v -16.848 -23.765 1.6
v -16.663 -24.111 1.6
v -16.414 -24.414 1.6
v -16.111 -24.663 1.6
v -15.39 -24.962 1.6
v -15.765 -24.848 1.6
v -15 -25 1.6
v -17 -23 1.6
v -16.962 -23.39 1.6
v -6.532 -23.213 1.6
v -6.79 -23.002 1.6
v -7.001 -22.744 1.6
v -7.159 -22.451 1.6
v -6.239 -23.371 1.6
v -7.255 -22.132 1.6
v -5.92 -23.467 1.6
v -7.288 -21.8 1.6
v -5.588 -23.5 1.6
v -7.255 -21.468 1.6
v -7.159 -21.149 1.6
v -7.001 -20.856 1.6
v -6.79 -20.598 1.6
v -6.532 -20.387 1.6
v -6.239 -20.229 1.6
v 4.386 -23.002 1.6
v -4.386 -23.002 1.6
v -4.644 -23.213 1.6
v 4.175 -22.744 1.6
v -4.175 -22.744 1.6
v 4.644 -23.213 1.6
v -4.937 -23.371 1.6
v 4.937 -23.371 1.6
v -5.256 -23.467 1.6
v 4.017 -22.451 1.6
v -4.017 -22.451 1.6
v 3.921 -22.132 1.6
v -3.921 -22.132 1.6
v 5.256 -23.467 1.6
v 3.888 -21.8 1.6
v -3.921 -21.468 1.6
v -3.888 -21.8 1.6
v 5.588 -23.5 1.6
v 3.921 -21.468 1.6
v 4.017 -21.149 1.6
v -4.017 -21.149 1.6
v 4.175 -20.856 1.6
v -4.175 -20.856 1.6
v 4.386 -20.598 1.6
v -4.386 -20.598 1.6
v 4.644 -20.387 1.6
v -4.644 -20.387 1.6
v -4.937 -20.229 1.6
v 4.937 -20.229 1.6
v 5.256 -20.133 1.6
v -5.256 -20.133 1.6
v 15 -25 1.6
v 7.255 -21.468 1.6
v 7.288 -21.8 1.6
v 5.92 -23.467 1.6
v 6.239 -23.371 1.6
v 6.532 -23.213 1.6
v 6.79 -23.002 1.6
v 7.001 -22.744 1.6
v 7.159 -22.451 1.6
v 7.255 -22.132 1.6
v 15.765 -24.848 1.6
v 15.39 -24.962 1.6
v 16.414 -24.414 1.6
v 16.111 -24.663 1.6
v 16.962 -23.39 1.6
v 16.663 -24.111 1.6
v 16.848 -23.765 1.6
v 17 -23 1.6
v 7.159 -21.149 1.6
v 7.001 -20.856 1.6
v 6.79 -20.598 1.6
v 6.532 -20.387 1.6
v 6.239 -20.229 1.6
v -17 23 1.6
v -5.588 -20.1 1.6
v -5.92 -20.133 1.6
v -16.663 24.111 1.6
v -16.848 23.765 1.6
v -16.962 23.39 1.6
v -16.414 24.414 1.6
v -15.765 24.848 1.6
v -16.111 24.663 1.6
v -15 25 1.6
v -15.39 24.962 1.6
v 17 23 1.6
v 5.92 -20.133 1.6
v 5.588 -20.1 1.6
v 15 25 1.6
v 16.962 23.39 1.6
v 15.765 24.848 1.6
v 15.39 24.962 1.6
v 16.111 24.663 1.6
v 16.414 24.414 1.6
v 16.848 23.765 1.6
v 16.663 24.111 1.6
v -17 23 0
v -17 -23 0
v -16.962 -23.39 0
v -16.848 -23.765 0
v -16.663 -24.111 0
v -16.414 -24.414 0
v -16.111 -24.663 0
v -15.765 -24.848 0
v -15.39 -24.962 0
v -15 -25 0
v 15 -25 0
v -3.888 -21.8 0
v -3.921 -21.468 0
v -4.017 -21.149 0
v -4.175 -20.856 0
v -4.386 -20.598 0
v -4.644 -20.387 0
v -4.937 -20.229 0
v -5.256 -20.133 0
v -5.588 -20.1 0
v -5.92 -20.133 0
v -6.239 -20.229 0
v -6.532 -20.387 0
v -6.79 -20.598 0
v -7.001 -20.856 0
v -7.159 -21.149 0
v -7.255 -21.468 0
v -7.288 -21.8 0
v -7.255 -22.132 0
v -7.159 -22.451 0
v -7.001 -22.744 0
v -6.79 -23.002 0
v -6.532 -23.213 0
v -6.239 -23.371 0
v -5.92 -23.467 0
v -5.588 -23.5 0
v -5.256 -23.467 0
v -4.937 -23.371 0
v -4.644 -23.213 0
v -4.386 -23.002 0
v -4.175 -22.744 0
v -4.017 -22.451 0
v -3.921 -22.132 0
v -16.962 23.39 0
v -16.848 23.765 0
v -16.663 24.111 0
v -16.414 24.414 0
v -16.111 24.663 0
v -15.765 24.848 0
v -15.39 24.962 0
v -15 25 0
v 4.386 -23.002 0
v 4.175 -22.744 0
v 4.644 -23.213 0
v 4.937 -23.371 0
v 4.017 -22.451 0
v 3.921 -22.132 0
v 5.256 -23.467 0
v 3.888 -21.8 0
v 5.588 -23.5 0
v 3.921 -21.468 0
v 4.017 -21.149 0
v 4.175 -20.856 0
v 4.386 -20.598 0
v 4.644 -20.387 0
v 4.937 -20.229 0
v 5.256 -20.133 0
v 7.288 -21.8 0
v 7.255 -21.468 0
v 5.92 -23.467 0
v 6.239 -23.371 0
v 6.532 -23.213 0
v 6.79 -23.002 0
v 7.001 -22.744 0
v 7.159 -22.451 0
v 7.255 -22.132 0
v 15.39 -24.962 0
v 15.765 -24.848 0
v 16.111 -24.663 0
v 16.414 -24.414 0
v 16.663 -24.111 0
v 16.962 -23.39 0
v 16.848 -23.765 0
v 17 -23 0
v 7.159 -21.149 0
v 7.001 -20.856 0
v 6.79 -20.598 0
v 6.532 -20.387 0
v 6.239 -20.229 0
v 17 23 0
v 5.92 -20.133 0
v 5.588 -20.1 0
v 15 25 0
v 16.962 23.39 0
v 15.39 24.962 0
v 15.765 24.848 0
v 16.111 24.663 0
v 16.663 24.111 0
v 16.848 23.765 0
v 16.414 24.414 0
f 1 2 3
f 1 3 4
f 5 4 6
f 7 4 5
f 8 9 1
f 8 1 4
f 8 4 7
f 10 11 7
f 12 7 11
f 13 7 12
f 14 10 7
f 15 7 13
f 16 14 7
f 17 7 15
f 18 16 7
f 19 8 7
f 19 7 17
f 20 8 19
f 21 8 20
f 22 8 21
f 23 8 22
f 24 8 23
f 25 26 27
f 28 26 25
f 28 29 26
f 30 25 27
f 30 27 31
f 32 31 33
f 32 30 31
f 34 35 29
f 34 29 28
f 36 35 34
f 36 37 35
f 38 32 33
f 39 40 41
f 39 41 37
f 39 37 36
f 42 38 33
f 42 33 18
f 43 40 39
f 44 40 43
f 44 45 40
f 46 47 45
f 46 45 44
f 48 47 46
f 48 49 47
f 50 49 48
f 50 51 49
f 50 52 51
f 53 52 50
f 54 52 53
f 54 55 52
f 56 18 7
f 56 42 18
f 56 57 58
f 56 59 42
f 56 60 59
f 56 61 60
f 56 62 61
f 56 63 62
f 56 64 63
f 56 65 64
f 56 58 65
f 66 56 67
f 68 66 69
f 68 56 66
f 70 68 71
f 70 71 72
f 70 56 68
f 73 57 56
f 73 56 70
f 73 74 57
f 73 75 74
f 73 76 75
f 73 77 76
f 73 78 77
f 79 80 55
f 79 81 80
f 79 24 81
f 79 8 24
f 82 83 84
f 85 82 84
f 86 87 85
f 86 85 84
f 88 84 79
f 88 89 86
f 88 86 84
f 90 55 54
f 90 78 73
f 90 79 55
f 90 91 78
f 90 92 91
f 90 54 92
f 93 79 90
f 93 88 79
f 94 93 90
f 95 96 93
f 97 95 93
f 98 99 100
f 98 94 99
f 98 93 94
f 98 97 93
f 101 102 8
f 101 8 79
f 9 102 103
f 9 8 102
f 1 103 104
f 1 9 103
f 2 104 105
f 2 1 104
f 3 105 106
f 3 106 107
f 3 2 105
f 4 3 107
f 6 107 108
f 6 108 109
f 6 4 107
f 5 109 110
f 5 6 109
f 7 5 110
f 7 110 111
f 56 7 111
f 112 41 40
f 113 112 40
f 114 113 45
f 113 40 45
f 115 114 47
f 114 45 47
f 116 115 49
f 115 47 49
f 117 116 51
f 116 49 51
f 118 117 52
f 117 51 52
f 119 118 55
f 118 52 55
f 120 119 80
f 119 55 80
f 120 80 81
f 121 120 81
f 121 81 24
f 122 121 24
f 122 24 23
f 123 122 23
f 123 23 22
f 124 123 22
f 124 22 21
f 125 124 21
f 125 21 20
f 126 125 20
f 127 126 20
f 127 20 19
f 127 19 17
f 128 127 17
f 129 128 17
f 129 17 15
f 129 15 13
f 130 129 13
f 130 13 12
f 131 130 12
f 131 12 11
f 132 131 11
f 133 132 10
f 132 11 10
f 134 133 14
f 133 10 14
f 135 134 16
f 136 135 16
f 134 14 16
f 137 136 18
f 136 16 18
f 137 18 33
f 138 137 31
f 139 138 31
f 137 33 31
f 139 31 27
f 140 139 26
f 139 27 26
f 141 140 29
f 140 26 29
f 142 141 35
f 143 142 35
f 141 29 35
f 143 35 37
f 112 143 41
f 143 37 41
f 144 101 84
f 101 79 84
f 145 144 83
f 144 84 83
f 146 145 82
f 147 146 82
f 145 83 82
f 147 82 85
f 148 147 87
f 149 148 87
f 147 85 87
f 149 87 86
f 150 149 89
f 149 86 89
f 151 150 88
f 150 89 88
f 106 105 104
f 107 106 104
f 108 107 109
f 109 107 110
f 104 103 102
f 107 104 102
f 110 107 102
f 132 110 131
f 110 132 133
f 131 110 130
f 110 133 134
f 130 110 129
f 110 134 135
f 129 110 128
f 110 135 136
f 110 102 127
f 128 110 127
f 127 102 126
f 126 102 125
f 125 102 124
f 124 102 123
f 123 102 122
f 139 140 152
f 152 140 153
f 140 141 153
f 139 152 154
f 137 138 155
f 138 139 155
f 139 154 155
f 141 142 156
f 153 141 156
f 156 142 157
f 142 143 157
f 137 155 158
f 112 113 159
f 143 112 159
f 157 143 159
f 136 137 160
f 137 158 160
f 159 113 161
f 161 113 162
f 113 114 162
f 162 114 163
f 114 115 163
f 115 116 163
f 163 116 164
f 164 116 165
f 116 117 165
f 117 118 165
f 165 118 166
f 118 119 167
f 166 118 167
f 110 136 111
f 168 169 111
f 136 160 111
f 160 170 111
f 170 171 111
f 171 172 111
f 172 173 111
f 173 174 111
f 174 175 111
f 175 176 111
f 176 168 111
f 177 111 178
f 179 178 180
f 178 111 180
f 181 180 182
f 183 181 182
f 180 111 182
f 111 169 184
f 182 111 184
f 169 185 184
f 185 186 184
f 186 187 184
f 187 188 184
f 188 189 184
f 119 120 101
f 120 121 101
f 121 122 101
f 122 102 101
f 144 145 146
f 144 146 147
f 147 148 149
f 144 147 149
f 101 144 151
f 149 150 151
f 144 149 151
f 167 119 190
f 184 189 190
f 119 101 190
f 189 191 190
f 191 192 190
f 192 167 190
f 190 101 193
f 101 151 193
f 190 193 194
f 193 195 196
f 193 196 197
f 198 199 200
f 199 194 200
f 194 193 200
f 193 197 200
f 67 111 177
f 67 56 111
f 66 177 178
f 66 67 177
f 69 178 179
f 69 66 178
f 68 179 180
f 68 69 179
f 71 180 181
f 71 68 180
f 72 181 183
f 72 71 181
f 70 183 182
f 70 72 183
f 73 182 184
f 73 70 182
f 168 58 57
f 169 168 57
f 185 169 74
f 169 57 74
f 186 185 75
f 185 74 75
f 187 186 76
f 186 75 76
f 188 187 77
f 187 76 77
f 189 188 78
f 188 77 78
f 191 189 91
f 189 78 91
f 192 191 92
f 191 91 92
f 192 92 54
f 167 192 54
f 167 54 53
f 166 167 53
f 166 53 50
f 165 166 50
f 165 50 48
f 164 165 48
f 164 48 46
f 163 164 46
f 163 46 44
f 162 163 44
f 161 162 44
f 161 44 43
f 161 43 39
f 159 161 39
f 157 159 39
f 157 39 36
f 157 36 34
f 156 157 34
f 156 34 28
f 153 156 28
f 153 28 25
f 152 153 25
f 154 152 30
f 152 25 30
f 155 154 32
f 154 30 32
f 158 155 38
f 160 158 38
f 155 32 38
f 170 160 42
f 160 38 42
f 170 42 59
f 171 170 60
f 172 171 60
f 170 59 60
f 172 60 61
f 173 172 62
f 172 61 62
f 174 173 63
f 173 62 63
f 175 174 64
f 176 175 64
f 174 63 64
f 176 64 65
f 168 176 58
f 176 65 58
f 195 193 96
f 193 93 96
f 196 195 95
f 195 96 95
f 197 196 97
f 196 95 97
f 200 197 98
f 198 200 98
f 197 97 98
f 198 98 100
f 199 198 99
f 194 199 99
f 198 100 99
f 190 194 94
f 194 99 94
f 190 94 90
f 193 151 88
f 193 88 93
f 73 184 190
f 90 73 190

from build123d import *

# Parameters (mm, degrees)
SKETCH_W    = 34
SKETCH_H    = 50
PAD_DEPTH   = 1.6
SKETCH001_R = 1.7
HOLE_DEPTH  = 25
FILLET_R    = 2


with BuildPart() as part:
    # Sketch → Pad (new body)
    with BuildSketch(Plane.XY):
        Rectangle(SKETCH_W, SKETCH_H)
    extrude(amount=PAD_DEPTH)

    # Sketch001 (on Face6 of Pad) → Hole (cut)
    with BuildSketch(Plane.XY.offset(1.6)):
        with Locations((-5.588, -21.8)):
            Circle(SKETCH001_R)
        with Locations((5.588, -21.8)):
            Circle(SKETCH001_R)
    extrude(amount=-HOLE_DEPTH, mode=Mode.SUBTRACT)

    # Fillet
    fillet_edges = [part.edges().sort_by_distance(p)[0] for p in [
        (-17, 25, 0.8),
        (17, 25, 0.8),
        (17, -25, 0.8),
        (-17, -25, 0.8),
    ]]
    fillet(fillet_edges, radius=FILLET_R)


solid = part.part
